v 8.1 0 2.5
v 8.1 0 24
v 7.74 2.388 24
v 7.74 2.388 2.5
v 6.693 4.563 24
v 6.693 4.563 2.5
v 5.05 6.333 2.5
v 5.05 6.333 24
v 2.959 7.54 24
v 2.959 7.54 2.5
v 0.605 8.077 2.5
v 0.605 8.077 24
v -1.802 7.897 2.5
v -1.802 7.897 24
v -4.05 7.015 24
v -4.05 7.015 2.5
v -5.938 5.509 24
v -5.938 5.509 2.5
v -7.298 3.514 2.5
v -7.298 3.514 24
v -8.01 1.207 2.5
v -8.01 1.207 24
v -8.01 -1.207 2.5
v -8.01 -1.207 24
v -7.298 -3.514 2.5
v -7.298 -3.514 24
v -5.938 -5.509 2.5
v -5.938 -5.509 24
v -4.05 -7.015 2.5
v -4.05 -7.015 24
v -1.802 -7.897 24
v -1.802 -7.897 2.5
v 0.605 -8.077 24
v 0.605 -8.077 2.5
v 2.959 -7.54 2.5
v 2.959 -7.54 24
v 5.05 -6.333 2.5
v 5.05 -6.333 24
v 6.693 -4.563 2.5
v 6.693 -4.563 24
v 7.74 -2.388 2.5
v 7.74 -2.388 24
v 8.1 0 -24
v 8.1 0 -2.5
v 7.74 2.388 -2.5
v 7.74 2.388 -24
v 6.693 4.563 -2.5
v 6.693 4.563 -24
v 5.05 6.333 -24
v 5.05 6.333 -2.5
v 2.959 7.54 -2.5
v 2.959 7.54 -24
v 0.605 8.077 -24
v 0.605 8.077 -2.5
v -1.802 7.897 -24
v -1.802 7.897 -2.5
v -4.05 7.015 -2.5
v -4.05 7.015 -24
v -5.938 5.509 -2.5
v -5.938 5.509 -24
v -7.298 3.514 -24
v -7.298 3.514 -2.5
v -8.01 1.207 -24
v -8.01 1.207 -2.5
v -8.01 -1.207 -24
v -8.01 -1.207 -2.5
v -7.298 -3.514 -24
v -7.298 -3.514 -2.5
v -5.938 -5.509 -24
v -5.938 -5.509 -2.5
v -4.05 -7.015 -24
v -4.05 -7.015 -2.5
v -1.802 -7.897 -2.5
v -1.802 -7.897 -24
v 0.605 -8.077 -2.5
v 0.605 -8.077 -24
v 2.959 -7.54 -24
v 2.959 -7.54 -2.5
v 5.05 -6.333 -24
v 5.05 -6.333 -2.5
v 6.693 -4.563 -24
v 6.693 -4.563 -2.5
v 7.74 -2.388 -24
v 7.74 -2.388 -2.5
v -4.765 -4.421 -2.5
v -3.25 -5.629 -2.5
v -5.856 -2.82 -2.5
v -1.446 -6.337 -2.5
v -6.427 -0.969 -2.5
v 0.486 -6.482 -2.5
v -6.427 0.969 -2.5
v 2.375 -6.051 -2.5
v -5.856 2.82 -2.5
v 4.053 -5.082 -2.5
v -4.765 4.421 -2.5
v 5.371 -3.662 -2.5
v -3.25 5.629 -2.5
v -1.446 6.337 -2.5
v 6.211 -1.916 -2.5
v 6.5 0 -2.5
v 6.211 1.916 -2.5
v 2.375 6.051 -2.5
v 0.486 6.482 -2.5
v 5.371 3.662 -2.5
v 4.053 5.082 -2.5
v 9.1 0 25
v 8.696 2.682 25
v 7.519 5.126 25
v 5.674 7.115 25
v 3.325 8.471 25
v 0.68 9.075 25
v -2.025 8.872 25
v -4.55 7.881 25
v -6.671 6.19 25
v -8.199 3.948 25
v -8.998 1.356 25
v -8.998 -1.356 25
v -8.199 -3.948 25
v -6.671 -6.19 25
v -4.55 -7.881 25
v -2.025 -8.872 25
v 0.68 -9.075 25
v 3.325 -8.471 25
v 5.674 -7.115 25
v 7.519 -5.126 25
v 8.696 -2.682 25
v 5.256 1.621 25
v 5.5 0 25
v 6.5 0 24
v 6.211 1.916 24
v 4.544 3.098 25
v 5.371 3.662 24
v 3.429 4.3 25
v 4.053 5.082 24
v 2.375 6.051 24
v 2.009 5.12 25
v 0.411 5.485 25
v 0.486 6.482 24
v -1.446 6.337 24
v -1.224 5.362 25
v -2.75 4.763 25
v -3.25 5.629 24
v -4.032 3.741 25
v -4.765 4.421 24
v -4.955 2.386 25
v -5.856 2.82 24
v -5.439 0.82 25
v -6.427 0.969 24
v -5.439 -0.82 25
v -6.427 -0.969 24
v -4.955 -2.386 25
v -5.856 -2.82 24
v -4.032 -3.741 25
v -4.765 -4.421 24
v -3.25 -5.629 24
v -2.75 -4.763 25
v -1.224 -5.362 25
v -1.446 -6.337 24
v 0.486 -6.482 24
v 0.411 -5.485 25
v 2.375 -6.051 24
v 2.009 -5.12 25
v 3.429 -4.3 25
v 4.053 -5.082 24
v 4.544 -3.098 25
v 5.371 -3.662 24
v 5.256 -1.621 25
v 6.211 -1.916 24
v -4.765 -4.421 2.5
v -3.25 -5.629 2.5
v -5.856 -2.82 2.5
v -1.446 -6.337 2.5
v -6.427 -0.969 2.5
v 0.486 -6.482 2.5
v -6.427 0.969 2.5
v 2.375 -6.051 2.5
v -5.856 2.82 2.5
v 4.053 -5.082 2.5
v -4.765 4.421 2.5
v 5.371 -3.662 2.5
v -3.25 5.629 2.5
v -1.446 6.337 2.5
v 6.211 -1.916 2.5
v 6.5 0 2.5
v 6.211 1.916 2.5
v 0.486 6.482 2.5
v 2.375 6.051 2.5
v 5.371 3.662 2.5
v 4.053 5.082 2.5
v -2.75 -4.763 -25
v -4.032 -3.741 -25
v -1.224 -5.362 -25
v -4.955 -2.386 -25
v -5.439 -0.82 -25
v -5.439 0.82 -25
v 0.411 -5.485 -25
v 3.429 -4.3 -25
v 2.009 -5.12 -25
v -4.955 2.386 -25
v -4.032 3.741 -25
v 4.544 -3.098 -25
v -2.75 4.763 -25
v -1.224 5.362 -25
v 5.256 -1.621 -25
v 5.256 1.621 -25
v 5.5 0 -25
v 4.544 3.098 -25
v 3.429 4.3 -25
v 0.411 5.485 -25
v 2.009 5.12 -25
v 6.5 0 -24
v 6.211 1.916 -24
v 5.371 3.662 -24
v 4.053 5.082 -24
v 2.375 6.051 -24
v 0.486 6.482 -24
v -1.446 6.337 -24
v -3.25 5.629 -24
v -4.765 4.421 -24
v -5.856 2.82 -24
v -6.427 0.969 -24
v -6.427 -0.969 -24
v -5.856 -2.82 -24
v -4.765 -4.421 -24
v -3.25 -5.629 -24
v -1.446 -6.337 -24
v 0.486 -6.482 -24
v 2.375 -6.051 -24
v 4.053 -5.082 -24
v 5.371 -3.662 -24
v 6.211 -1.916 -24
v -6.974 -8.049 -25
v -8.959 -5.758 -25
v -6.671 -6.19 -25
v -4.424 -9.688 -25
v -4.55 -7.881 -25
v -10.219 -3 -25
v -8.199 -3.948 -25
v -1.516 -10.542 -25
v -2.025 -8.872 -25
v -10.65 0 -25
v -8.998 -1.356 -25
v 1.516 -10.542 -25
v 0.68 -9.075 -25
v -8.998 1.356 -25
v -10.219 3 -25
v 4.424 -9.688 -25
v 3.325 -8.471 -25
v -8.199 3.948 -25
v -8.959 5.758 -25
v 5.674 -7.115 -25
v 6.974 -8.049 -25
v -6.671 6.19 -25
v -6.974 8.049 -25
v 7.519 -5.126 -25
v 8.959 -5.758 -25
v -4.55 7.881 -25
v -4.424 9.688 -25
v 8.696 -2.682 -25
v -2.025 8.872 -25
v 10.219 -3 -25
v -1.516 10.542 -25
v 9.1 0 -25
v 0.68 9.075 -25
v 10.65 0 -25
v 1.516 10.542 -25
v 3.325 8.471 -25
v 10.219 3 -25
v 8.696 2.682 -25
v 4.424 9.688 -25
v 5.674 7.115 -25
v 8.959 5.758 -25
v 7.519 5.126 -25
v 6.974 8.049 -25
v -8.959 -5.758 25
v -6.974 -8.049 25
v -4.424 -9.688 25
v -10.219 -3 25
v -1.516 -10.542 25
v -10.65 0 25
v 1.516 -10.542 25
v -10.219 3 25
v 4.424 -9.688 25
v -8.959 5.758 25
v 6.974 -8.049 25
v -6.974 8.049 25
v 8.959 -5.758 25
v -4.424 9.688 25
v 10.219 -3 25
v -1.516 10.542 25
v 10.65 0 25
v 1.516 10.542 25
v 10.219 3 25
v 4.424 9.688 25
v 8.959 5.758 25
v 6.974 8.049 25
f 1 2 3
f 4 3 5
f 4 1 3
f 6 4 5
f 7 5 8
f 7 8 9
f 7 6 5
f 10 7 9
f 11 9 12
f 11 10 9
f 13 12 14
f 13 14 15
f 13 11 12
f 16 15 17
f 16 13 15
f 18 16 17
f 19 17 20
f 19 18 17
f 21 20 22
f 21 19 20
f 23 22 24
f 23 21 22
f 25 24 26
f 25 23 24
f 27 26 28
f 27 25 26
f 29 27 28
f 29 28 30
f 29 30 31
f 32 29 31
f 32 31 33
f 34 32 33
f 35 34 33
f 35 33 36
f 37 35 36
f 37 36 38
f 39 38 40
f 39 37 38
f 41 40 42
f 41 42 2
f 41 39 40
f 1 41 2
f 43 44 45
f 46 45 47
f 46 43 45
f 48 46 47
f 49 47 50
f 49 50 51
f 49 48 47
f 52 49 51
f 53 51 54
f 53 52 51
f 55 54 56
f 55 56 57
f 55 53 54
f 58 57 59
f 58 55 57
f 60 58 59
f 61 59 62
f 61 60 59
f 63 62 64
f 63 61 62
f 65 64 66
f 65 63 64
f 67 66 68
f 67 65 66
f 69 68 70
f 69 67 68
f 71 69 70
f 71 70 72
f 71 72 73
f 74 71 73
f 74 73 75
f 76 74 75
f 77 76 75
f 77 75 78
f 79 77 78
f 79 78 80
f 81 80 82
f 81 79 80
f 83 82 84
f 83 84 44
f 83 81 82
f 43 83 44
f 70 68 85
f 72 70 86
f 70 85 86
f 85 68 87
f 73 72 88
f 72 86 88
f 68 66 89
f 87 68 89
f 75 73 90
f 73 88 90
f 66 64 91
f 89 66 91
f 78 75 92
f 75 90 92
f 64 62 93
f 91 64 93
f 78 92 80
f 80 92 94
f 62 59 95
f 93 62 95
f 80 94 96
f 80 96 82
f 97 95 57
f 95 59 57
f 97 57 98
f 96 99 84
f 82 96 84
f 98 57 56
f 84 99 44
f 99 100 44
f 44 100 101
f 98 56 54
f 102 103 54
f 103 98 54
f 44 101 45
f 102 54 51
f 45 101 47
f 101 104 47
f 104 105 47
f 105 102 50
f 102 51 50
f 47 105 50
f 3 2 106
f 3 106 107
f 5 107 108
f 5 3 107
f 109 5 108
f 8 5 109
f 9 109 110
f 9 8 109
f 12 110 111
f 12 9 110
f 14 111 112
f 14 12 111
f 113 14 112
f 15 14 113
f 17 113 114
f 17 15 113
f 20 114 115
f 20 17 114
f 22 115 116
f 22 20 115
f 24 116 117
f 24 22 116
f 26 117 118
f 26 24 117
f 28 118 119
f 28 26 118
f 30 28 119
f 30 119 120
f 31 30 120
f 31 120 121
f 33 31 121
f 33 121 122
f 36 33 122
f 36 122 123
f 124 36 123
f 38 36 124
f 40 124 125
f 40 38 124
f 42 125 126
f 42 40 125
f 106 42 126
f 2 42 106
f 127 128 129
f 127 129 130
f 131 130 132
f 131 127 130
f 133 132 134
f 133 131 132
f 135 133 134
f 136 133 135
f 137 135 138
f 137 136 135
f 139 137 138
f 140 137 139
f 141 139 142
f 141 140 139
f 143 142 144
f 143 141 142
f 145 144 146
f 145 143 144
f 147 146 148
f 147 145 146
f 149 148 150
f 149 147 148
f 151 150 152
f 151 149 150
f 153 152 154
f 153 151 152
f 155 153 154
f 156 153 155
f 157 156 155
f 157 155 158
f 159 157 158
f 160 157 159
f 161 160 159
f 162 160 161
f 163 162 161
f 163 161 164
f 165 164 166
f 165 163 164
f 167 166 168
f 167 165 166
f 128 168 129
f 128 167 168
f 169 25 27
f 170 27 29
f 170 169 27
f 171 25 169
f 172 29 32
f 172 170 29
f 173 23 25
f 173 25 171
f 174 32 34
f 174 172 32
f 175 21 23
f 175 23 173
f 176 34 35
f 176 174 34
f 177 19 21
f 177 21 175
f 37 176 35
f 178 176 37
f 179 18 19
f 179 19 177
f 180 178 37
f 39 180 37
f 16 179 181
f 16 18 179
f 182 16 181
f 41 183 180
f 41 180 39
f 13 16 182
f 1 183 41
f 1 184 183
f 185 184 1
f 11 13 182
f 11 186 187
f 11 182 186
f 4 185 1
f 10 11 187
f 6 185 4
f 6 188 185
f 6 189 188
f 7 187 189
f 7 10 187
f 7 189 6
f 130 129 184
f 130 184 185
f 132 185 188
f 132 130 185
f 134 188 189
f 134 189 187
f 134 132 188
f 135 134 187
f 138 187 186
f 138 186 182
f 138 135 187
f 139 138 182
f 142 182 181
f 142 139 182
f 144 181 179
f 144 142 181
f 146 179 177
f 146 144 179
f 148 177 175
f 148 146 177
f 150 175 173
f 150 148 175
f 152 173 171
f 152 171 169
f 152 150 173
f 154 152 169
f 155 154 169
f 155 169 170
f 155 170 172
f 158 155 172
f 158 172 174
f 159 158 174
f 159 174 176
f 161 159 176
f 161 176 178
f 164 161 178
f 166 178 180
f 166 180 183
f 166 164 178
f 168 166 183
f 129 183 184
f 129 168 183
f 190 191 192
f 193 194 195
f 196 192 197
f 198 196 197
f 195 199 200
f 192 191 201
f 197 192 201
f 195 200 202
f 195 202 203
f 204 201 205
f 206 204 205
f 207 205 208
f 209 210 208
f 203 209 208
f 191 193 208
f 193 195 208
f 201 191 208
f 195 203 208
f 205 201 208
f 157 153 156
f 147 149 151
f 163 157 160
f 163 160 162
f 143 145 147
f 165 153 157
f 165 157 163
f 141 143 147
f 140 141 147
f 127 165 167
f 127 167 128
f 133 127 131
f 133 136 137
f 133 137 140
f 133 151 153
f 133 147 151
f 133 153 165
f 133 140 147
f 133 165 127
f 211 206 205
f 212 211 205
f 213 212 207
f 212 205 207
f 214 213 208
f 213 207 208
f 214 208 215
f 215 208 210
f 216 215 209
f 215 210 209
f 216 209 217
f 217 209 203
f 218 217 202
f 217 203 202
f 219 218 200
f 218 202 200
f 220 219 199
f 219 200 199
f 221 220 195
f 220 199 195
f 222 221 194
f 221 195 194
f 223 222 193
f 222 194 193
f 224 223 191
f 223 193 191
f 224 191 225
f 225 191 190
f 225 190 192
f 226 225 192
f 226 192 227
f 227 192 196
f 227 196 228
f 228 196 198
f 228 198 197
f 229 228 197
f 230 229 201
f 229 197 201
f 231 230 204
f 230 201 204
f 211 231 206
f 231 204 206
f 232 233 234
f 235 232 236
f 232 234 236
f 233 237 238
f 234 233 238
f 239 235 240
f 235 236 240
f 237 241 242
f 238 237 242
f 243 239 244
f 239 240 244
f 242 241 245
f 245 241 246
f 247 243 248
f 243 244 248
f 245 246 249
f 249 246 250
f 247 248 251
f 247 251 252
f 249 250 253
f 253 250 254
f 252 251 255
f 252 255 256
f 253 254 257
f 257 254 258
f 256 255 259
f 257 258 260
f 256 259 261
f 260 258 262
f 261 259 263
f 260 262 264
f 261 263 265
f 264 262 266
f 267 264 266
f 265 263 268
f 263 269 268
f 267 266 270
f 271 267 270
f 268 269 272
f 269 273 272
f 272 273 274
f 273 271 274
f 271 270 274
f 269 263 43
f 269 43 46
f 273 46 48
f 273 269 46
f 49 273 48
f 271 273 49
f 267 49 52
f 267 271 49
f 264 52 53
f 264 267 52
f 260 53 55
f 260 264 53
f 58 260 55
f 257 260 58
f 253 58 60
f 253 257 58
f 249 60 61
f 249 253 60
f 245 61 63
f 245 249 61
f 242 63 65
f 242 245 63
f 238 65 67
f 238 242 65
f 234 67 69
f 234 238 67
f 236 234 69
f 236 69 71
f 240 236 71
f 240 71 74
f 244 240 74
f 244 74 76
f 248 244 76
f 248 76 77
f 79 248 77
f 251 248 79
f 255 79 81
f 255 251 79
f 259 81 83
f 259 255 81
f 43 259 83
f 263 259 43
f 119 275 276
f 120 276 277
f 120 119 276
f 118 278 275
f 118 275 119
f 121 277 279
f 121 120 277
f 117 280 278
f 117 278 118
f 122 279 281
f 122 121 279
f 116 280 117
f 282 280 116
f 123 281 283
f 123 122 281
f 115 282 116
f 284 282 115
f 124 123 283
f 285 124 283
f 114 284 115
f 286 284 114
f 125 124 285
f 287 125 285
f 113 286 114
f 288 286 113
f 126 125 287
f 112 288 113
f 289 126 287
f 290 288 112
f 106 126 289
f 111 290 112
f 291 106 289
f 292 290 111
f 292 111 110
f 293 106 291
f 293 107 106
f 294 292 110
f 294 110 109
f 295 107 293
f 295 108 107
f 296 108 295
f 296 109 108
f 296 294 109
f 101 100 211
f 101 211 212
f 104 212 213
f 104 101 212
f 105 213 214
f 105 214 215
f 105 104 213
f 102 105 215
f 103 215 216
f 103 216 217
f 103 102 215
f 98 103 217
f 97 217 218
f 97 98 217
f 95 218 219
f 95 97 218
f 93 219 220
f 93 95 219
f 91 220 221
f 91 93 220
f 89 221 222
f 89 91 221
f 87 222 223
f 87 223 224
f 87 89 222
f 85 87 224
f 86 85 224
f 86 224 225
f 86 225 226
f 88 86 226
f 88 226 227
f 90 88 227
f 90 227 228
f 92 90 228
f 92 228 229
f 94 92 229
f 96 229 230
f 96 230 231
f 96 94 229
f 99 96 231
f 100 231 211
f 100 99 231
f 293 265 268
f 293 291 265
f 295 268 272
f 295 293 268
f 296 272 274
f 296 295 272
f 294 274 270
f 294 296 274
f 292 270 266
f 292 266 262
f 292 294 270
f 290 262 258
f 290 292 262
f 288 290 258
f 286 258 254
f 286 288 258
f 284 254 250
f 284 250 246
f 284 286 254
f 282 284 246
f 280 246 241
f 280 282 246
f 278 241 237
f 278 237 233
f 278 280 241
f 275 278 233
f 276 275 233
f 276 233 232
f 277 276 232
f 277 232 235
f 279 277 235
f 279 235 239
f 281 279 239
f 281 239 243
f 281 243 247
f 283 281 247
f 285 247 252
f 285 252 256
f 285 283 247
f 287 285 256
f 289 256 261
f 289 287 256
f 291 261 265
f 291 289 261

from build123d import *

# Parameters (mm, degrees)
F0_R     = 10.65
F0_R_2   = 8.1
F1_DEPTH = 25
F0_R_3   = 6.5
F2_DEPTH = 2.5
F3_DEPTH = 25
F4_SIZE  = 1


with BuildPart() as f1:
    # F0 (on Top) → F1 (new body, symmetric)
    with BuildSketch(Plane.XY):
        Circle(F0_R)
        Circle(F0_R_2, mode=Mode.SUBTRACT)
    extrude(amount=F1_DEPTH, both=True)

    # F0 (on Top) → F2 (join, symmetric)
    with BuildSketch(Plane.XY):
        Circle(F0_R_2)
        Circle(F0_R_3, mode=Mode.SUBTRACT)
    extrude(amount=F2_DEPTH, both=True)

    # F0 (on Top) → F3 (join, symmetric)
    with BuildSketch(Plane.XY):
        Circle(F0_R_3)
    extrude(amount=F3_DEPTH, both=True)

    # F4
    f4_edges = [f1.edges().sort_by_distance(p)[0] for p in [
        (-8.1, 0, -25),
        (-6.5, 0, -25),
        (-8.1, 0, 25),
        (-6.5, 0, 25),
    ]]
    chamfer(f4_edges, length=F4_SIZE)


solid = f1.part
